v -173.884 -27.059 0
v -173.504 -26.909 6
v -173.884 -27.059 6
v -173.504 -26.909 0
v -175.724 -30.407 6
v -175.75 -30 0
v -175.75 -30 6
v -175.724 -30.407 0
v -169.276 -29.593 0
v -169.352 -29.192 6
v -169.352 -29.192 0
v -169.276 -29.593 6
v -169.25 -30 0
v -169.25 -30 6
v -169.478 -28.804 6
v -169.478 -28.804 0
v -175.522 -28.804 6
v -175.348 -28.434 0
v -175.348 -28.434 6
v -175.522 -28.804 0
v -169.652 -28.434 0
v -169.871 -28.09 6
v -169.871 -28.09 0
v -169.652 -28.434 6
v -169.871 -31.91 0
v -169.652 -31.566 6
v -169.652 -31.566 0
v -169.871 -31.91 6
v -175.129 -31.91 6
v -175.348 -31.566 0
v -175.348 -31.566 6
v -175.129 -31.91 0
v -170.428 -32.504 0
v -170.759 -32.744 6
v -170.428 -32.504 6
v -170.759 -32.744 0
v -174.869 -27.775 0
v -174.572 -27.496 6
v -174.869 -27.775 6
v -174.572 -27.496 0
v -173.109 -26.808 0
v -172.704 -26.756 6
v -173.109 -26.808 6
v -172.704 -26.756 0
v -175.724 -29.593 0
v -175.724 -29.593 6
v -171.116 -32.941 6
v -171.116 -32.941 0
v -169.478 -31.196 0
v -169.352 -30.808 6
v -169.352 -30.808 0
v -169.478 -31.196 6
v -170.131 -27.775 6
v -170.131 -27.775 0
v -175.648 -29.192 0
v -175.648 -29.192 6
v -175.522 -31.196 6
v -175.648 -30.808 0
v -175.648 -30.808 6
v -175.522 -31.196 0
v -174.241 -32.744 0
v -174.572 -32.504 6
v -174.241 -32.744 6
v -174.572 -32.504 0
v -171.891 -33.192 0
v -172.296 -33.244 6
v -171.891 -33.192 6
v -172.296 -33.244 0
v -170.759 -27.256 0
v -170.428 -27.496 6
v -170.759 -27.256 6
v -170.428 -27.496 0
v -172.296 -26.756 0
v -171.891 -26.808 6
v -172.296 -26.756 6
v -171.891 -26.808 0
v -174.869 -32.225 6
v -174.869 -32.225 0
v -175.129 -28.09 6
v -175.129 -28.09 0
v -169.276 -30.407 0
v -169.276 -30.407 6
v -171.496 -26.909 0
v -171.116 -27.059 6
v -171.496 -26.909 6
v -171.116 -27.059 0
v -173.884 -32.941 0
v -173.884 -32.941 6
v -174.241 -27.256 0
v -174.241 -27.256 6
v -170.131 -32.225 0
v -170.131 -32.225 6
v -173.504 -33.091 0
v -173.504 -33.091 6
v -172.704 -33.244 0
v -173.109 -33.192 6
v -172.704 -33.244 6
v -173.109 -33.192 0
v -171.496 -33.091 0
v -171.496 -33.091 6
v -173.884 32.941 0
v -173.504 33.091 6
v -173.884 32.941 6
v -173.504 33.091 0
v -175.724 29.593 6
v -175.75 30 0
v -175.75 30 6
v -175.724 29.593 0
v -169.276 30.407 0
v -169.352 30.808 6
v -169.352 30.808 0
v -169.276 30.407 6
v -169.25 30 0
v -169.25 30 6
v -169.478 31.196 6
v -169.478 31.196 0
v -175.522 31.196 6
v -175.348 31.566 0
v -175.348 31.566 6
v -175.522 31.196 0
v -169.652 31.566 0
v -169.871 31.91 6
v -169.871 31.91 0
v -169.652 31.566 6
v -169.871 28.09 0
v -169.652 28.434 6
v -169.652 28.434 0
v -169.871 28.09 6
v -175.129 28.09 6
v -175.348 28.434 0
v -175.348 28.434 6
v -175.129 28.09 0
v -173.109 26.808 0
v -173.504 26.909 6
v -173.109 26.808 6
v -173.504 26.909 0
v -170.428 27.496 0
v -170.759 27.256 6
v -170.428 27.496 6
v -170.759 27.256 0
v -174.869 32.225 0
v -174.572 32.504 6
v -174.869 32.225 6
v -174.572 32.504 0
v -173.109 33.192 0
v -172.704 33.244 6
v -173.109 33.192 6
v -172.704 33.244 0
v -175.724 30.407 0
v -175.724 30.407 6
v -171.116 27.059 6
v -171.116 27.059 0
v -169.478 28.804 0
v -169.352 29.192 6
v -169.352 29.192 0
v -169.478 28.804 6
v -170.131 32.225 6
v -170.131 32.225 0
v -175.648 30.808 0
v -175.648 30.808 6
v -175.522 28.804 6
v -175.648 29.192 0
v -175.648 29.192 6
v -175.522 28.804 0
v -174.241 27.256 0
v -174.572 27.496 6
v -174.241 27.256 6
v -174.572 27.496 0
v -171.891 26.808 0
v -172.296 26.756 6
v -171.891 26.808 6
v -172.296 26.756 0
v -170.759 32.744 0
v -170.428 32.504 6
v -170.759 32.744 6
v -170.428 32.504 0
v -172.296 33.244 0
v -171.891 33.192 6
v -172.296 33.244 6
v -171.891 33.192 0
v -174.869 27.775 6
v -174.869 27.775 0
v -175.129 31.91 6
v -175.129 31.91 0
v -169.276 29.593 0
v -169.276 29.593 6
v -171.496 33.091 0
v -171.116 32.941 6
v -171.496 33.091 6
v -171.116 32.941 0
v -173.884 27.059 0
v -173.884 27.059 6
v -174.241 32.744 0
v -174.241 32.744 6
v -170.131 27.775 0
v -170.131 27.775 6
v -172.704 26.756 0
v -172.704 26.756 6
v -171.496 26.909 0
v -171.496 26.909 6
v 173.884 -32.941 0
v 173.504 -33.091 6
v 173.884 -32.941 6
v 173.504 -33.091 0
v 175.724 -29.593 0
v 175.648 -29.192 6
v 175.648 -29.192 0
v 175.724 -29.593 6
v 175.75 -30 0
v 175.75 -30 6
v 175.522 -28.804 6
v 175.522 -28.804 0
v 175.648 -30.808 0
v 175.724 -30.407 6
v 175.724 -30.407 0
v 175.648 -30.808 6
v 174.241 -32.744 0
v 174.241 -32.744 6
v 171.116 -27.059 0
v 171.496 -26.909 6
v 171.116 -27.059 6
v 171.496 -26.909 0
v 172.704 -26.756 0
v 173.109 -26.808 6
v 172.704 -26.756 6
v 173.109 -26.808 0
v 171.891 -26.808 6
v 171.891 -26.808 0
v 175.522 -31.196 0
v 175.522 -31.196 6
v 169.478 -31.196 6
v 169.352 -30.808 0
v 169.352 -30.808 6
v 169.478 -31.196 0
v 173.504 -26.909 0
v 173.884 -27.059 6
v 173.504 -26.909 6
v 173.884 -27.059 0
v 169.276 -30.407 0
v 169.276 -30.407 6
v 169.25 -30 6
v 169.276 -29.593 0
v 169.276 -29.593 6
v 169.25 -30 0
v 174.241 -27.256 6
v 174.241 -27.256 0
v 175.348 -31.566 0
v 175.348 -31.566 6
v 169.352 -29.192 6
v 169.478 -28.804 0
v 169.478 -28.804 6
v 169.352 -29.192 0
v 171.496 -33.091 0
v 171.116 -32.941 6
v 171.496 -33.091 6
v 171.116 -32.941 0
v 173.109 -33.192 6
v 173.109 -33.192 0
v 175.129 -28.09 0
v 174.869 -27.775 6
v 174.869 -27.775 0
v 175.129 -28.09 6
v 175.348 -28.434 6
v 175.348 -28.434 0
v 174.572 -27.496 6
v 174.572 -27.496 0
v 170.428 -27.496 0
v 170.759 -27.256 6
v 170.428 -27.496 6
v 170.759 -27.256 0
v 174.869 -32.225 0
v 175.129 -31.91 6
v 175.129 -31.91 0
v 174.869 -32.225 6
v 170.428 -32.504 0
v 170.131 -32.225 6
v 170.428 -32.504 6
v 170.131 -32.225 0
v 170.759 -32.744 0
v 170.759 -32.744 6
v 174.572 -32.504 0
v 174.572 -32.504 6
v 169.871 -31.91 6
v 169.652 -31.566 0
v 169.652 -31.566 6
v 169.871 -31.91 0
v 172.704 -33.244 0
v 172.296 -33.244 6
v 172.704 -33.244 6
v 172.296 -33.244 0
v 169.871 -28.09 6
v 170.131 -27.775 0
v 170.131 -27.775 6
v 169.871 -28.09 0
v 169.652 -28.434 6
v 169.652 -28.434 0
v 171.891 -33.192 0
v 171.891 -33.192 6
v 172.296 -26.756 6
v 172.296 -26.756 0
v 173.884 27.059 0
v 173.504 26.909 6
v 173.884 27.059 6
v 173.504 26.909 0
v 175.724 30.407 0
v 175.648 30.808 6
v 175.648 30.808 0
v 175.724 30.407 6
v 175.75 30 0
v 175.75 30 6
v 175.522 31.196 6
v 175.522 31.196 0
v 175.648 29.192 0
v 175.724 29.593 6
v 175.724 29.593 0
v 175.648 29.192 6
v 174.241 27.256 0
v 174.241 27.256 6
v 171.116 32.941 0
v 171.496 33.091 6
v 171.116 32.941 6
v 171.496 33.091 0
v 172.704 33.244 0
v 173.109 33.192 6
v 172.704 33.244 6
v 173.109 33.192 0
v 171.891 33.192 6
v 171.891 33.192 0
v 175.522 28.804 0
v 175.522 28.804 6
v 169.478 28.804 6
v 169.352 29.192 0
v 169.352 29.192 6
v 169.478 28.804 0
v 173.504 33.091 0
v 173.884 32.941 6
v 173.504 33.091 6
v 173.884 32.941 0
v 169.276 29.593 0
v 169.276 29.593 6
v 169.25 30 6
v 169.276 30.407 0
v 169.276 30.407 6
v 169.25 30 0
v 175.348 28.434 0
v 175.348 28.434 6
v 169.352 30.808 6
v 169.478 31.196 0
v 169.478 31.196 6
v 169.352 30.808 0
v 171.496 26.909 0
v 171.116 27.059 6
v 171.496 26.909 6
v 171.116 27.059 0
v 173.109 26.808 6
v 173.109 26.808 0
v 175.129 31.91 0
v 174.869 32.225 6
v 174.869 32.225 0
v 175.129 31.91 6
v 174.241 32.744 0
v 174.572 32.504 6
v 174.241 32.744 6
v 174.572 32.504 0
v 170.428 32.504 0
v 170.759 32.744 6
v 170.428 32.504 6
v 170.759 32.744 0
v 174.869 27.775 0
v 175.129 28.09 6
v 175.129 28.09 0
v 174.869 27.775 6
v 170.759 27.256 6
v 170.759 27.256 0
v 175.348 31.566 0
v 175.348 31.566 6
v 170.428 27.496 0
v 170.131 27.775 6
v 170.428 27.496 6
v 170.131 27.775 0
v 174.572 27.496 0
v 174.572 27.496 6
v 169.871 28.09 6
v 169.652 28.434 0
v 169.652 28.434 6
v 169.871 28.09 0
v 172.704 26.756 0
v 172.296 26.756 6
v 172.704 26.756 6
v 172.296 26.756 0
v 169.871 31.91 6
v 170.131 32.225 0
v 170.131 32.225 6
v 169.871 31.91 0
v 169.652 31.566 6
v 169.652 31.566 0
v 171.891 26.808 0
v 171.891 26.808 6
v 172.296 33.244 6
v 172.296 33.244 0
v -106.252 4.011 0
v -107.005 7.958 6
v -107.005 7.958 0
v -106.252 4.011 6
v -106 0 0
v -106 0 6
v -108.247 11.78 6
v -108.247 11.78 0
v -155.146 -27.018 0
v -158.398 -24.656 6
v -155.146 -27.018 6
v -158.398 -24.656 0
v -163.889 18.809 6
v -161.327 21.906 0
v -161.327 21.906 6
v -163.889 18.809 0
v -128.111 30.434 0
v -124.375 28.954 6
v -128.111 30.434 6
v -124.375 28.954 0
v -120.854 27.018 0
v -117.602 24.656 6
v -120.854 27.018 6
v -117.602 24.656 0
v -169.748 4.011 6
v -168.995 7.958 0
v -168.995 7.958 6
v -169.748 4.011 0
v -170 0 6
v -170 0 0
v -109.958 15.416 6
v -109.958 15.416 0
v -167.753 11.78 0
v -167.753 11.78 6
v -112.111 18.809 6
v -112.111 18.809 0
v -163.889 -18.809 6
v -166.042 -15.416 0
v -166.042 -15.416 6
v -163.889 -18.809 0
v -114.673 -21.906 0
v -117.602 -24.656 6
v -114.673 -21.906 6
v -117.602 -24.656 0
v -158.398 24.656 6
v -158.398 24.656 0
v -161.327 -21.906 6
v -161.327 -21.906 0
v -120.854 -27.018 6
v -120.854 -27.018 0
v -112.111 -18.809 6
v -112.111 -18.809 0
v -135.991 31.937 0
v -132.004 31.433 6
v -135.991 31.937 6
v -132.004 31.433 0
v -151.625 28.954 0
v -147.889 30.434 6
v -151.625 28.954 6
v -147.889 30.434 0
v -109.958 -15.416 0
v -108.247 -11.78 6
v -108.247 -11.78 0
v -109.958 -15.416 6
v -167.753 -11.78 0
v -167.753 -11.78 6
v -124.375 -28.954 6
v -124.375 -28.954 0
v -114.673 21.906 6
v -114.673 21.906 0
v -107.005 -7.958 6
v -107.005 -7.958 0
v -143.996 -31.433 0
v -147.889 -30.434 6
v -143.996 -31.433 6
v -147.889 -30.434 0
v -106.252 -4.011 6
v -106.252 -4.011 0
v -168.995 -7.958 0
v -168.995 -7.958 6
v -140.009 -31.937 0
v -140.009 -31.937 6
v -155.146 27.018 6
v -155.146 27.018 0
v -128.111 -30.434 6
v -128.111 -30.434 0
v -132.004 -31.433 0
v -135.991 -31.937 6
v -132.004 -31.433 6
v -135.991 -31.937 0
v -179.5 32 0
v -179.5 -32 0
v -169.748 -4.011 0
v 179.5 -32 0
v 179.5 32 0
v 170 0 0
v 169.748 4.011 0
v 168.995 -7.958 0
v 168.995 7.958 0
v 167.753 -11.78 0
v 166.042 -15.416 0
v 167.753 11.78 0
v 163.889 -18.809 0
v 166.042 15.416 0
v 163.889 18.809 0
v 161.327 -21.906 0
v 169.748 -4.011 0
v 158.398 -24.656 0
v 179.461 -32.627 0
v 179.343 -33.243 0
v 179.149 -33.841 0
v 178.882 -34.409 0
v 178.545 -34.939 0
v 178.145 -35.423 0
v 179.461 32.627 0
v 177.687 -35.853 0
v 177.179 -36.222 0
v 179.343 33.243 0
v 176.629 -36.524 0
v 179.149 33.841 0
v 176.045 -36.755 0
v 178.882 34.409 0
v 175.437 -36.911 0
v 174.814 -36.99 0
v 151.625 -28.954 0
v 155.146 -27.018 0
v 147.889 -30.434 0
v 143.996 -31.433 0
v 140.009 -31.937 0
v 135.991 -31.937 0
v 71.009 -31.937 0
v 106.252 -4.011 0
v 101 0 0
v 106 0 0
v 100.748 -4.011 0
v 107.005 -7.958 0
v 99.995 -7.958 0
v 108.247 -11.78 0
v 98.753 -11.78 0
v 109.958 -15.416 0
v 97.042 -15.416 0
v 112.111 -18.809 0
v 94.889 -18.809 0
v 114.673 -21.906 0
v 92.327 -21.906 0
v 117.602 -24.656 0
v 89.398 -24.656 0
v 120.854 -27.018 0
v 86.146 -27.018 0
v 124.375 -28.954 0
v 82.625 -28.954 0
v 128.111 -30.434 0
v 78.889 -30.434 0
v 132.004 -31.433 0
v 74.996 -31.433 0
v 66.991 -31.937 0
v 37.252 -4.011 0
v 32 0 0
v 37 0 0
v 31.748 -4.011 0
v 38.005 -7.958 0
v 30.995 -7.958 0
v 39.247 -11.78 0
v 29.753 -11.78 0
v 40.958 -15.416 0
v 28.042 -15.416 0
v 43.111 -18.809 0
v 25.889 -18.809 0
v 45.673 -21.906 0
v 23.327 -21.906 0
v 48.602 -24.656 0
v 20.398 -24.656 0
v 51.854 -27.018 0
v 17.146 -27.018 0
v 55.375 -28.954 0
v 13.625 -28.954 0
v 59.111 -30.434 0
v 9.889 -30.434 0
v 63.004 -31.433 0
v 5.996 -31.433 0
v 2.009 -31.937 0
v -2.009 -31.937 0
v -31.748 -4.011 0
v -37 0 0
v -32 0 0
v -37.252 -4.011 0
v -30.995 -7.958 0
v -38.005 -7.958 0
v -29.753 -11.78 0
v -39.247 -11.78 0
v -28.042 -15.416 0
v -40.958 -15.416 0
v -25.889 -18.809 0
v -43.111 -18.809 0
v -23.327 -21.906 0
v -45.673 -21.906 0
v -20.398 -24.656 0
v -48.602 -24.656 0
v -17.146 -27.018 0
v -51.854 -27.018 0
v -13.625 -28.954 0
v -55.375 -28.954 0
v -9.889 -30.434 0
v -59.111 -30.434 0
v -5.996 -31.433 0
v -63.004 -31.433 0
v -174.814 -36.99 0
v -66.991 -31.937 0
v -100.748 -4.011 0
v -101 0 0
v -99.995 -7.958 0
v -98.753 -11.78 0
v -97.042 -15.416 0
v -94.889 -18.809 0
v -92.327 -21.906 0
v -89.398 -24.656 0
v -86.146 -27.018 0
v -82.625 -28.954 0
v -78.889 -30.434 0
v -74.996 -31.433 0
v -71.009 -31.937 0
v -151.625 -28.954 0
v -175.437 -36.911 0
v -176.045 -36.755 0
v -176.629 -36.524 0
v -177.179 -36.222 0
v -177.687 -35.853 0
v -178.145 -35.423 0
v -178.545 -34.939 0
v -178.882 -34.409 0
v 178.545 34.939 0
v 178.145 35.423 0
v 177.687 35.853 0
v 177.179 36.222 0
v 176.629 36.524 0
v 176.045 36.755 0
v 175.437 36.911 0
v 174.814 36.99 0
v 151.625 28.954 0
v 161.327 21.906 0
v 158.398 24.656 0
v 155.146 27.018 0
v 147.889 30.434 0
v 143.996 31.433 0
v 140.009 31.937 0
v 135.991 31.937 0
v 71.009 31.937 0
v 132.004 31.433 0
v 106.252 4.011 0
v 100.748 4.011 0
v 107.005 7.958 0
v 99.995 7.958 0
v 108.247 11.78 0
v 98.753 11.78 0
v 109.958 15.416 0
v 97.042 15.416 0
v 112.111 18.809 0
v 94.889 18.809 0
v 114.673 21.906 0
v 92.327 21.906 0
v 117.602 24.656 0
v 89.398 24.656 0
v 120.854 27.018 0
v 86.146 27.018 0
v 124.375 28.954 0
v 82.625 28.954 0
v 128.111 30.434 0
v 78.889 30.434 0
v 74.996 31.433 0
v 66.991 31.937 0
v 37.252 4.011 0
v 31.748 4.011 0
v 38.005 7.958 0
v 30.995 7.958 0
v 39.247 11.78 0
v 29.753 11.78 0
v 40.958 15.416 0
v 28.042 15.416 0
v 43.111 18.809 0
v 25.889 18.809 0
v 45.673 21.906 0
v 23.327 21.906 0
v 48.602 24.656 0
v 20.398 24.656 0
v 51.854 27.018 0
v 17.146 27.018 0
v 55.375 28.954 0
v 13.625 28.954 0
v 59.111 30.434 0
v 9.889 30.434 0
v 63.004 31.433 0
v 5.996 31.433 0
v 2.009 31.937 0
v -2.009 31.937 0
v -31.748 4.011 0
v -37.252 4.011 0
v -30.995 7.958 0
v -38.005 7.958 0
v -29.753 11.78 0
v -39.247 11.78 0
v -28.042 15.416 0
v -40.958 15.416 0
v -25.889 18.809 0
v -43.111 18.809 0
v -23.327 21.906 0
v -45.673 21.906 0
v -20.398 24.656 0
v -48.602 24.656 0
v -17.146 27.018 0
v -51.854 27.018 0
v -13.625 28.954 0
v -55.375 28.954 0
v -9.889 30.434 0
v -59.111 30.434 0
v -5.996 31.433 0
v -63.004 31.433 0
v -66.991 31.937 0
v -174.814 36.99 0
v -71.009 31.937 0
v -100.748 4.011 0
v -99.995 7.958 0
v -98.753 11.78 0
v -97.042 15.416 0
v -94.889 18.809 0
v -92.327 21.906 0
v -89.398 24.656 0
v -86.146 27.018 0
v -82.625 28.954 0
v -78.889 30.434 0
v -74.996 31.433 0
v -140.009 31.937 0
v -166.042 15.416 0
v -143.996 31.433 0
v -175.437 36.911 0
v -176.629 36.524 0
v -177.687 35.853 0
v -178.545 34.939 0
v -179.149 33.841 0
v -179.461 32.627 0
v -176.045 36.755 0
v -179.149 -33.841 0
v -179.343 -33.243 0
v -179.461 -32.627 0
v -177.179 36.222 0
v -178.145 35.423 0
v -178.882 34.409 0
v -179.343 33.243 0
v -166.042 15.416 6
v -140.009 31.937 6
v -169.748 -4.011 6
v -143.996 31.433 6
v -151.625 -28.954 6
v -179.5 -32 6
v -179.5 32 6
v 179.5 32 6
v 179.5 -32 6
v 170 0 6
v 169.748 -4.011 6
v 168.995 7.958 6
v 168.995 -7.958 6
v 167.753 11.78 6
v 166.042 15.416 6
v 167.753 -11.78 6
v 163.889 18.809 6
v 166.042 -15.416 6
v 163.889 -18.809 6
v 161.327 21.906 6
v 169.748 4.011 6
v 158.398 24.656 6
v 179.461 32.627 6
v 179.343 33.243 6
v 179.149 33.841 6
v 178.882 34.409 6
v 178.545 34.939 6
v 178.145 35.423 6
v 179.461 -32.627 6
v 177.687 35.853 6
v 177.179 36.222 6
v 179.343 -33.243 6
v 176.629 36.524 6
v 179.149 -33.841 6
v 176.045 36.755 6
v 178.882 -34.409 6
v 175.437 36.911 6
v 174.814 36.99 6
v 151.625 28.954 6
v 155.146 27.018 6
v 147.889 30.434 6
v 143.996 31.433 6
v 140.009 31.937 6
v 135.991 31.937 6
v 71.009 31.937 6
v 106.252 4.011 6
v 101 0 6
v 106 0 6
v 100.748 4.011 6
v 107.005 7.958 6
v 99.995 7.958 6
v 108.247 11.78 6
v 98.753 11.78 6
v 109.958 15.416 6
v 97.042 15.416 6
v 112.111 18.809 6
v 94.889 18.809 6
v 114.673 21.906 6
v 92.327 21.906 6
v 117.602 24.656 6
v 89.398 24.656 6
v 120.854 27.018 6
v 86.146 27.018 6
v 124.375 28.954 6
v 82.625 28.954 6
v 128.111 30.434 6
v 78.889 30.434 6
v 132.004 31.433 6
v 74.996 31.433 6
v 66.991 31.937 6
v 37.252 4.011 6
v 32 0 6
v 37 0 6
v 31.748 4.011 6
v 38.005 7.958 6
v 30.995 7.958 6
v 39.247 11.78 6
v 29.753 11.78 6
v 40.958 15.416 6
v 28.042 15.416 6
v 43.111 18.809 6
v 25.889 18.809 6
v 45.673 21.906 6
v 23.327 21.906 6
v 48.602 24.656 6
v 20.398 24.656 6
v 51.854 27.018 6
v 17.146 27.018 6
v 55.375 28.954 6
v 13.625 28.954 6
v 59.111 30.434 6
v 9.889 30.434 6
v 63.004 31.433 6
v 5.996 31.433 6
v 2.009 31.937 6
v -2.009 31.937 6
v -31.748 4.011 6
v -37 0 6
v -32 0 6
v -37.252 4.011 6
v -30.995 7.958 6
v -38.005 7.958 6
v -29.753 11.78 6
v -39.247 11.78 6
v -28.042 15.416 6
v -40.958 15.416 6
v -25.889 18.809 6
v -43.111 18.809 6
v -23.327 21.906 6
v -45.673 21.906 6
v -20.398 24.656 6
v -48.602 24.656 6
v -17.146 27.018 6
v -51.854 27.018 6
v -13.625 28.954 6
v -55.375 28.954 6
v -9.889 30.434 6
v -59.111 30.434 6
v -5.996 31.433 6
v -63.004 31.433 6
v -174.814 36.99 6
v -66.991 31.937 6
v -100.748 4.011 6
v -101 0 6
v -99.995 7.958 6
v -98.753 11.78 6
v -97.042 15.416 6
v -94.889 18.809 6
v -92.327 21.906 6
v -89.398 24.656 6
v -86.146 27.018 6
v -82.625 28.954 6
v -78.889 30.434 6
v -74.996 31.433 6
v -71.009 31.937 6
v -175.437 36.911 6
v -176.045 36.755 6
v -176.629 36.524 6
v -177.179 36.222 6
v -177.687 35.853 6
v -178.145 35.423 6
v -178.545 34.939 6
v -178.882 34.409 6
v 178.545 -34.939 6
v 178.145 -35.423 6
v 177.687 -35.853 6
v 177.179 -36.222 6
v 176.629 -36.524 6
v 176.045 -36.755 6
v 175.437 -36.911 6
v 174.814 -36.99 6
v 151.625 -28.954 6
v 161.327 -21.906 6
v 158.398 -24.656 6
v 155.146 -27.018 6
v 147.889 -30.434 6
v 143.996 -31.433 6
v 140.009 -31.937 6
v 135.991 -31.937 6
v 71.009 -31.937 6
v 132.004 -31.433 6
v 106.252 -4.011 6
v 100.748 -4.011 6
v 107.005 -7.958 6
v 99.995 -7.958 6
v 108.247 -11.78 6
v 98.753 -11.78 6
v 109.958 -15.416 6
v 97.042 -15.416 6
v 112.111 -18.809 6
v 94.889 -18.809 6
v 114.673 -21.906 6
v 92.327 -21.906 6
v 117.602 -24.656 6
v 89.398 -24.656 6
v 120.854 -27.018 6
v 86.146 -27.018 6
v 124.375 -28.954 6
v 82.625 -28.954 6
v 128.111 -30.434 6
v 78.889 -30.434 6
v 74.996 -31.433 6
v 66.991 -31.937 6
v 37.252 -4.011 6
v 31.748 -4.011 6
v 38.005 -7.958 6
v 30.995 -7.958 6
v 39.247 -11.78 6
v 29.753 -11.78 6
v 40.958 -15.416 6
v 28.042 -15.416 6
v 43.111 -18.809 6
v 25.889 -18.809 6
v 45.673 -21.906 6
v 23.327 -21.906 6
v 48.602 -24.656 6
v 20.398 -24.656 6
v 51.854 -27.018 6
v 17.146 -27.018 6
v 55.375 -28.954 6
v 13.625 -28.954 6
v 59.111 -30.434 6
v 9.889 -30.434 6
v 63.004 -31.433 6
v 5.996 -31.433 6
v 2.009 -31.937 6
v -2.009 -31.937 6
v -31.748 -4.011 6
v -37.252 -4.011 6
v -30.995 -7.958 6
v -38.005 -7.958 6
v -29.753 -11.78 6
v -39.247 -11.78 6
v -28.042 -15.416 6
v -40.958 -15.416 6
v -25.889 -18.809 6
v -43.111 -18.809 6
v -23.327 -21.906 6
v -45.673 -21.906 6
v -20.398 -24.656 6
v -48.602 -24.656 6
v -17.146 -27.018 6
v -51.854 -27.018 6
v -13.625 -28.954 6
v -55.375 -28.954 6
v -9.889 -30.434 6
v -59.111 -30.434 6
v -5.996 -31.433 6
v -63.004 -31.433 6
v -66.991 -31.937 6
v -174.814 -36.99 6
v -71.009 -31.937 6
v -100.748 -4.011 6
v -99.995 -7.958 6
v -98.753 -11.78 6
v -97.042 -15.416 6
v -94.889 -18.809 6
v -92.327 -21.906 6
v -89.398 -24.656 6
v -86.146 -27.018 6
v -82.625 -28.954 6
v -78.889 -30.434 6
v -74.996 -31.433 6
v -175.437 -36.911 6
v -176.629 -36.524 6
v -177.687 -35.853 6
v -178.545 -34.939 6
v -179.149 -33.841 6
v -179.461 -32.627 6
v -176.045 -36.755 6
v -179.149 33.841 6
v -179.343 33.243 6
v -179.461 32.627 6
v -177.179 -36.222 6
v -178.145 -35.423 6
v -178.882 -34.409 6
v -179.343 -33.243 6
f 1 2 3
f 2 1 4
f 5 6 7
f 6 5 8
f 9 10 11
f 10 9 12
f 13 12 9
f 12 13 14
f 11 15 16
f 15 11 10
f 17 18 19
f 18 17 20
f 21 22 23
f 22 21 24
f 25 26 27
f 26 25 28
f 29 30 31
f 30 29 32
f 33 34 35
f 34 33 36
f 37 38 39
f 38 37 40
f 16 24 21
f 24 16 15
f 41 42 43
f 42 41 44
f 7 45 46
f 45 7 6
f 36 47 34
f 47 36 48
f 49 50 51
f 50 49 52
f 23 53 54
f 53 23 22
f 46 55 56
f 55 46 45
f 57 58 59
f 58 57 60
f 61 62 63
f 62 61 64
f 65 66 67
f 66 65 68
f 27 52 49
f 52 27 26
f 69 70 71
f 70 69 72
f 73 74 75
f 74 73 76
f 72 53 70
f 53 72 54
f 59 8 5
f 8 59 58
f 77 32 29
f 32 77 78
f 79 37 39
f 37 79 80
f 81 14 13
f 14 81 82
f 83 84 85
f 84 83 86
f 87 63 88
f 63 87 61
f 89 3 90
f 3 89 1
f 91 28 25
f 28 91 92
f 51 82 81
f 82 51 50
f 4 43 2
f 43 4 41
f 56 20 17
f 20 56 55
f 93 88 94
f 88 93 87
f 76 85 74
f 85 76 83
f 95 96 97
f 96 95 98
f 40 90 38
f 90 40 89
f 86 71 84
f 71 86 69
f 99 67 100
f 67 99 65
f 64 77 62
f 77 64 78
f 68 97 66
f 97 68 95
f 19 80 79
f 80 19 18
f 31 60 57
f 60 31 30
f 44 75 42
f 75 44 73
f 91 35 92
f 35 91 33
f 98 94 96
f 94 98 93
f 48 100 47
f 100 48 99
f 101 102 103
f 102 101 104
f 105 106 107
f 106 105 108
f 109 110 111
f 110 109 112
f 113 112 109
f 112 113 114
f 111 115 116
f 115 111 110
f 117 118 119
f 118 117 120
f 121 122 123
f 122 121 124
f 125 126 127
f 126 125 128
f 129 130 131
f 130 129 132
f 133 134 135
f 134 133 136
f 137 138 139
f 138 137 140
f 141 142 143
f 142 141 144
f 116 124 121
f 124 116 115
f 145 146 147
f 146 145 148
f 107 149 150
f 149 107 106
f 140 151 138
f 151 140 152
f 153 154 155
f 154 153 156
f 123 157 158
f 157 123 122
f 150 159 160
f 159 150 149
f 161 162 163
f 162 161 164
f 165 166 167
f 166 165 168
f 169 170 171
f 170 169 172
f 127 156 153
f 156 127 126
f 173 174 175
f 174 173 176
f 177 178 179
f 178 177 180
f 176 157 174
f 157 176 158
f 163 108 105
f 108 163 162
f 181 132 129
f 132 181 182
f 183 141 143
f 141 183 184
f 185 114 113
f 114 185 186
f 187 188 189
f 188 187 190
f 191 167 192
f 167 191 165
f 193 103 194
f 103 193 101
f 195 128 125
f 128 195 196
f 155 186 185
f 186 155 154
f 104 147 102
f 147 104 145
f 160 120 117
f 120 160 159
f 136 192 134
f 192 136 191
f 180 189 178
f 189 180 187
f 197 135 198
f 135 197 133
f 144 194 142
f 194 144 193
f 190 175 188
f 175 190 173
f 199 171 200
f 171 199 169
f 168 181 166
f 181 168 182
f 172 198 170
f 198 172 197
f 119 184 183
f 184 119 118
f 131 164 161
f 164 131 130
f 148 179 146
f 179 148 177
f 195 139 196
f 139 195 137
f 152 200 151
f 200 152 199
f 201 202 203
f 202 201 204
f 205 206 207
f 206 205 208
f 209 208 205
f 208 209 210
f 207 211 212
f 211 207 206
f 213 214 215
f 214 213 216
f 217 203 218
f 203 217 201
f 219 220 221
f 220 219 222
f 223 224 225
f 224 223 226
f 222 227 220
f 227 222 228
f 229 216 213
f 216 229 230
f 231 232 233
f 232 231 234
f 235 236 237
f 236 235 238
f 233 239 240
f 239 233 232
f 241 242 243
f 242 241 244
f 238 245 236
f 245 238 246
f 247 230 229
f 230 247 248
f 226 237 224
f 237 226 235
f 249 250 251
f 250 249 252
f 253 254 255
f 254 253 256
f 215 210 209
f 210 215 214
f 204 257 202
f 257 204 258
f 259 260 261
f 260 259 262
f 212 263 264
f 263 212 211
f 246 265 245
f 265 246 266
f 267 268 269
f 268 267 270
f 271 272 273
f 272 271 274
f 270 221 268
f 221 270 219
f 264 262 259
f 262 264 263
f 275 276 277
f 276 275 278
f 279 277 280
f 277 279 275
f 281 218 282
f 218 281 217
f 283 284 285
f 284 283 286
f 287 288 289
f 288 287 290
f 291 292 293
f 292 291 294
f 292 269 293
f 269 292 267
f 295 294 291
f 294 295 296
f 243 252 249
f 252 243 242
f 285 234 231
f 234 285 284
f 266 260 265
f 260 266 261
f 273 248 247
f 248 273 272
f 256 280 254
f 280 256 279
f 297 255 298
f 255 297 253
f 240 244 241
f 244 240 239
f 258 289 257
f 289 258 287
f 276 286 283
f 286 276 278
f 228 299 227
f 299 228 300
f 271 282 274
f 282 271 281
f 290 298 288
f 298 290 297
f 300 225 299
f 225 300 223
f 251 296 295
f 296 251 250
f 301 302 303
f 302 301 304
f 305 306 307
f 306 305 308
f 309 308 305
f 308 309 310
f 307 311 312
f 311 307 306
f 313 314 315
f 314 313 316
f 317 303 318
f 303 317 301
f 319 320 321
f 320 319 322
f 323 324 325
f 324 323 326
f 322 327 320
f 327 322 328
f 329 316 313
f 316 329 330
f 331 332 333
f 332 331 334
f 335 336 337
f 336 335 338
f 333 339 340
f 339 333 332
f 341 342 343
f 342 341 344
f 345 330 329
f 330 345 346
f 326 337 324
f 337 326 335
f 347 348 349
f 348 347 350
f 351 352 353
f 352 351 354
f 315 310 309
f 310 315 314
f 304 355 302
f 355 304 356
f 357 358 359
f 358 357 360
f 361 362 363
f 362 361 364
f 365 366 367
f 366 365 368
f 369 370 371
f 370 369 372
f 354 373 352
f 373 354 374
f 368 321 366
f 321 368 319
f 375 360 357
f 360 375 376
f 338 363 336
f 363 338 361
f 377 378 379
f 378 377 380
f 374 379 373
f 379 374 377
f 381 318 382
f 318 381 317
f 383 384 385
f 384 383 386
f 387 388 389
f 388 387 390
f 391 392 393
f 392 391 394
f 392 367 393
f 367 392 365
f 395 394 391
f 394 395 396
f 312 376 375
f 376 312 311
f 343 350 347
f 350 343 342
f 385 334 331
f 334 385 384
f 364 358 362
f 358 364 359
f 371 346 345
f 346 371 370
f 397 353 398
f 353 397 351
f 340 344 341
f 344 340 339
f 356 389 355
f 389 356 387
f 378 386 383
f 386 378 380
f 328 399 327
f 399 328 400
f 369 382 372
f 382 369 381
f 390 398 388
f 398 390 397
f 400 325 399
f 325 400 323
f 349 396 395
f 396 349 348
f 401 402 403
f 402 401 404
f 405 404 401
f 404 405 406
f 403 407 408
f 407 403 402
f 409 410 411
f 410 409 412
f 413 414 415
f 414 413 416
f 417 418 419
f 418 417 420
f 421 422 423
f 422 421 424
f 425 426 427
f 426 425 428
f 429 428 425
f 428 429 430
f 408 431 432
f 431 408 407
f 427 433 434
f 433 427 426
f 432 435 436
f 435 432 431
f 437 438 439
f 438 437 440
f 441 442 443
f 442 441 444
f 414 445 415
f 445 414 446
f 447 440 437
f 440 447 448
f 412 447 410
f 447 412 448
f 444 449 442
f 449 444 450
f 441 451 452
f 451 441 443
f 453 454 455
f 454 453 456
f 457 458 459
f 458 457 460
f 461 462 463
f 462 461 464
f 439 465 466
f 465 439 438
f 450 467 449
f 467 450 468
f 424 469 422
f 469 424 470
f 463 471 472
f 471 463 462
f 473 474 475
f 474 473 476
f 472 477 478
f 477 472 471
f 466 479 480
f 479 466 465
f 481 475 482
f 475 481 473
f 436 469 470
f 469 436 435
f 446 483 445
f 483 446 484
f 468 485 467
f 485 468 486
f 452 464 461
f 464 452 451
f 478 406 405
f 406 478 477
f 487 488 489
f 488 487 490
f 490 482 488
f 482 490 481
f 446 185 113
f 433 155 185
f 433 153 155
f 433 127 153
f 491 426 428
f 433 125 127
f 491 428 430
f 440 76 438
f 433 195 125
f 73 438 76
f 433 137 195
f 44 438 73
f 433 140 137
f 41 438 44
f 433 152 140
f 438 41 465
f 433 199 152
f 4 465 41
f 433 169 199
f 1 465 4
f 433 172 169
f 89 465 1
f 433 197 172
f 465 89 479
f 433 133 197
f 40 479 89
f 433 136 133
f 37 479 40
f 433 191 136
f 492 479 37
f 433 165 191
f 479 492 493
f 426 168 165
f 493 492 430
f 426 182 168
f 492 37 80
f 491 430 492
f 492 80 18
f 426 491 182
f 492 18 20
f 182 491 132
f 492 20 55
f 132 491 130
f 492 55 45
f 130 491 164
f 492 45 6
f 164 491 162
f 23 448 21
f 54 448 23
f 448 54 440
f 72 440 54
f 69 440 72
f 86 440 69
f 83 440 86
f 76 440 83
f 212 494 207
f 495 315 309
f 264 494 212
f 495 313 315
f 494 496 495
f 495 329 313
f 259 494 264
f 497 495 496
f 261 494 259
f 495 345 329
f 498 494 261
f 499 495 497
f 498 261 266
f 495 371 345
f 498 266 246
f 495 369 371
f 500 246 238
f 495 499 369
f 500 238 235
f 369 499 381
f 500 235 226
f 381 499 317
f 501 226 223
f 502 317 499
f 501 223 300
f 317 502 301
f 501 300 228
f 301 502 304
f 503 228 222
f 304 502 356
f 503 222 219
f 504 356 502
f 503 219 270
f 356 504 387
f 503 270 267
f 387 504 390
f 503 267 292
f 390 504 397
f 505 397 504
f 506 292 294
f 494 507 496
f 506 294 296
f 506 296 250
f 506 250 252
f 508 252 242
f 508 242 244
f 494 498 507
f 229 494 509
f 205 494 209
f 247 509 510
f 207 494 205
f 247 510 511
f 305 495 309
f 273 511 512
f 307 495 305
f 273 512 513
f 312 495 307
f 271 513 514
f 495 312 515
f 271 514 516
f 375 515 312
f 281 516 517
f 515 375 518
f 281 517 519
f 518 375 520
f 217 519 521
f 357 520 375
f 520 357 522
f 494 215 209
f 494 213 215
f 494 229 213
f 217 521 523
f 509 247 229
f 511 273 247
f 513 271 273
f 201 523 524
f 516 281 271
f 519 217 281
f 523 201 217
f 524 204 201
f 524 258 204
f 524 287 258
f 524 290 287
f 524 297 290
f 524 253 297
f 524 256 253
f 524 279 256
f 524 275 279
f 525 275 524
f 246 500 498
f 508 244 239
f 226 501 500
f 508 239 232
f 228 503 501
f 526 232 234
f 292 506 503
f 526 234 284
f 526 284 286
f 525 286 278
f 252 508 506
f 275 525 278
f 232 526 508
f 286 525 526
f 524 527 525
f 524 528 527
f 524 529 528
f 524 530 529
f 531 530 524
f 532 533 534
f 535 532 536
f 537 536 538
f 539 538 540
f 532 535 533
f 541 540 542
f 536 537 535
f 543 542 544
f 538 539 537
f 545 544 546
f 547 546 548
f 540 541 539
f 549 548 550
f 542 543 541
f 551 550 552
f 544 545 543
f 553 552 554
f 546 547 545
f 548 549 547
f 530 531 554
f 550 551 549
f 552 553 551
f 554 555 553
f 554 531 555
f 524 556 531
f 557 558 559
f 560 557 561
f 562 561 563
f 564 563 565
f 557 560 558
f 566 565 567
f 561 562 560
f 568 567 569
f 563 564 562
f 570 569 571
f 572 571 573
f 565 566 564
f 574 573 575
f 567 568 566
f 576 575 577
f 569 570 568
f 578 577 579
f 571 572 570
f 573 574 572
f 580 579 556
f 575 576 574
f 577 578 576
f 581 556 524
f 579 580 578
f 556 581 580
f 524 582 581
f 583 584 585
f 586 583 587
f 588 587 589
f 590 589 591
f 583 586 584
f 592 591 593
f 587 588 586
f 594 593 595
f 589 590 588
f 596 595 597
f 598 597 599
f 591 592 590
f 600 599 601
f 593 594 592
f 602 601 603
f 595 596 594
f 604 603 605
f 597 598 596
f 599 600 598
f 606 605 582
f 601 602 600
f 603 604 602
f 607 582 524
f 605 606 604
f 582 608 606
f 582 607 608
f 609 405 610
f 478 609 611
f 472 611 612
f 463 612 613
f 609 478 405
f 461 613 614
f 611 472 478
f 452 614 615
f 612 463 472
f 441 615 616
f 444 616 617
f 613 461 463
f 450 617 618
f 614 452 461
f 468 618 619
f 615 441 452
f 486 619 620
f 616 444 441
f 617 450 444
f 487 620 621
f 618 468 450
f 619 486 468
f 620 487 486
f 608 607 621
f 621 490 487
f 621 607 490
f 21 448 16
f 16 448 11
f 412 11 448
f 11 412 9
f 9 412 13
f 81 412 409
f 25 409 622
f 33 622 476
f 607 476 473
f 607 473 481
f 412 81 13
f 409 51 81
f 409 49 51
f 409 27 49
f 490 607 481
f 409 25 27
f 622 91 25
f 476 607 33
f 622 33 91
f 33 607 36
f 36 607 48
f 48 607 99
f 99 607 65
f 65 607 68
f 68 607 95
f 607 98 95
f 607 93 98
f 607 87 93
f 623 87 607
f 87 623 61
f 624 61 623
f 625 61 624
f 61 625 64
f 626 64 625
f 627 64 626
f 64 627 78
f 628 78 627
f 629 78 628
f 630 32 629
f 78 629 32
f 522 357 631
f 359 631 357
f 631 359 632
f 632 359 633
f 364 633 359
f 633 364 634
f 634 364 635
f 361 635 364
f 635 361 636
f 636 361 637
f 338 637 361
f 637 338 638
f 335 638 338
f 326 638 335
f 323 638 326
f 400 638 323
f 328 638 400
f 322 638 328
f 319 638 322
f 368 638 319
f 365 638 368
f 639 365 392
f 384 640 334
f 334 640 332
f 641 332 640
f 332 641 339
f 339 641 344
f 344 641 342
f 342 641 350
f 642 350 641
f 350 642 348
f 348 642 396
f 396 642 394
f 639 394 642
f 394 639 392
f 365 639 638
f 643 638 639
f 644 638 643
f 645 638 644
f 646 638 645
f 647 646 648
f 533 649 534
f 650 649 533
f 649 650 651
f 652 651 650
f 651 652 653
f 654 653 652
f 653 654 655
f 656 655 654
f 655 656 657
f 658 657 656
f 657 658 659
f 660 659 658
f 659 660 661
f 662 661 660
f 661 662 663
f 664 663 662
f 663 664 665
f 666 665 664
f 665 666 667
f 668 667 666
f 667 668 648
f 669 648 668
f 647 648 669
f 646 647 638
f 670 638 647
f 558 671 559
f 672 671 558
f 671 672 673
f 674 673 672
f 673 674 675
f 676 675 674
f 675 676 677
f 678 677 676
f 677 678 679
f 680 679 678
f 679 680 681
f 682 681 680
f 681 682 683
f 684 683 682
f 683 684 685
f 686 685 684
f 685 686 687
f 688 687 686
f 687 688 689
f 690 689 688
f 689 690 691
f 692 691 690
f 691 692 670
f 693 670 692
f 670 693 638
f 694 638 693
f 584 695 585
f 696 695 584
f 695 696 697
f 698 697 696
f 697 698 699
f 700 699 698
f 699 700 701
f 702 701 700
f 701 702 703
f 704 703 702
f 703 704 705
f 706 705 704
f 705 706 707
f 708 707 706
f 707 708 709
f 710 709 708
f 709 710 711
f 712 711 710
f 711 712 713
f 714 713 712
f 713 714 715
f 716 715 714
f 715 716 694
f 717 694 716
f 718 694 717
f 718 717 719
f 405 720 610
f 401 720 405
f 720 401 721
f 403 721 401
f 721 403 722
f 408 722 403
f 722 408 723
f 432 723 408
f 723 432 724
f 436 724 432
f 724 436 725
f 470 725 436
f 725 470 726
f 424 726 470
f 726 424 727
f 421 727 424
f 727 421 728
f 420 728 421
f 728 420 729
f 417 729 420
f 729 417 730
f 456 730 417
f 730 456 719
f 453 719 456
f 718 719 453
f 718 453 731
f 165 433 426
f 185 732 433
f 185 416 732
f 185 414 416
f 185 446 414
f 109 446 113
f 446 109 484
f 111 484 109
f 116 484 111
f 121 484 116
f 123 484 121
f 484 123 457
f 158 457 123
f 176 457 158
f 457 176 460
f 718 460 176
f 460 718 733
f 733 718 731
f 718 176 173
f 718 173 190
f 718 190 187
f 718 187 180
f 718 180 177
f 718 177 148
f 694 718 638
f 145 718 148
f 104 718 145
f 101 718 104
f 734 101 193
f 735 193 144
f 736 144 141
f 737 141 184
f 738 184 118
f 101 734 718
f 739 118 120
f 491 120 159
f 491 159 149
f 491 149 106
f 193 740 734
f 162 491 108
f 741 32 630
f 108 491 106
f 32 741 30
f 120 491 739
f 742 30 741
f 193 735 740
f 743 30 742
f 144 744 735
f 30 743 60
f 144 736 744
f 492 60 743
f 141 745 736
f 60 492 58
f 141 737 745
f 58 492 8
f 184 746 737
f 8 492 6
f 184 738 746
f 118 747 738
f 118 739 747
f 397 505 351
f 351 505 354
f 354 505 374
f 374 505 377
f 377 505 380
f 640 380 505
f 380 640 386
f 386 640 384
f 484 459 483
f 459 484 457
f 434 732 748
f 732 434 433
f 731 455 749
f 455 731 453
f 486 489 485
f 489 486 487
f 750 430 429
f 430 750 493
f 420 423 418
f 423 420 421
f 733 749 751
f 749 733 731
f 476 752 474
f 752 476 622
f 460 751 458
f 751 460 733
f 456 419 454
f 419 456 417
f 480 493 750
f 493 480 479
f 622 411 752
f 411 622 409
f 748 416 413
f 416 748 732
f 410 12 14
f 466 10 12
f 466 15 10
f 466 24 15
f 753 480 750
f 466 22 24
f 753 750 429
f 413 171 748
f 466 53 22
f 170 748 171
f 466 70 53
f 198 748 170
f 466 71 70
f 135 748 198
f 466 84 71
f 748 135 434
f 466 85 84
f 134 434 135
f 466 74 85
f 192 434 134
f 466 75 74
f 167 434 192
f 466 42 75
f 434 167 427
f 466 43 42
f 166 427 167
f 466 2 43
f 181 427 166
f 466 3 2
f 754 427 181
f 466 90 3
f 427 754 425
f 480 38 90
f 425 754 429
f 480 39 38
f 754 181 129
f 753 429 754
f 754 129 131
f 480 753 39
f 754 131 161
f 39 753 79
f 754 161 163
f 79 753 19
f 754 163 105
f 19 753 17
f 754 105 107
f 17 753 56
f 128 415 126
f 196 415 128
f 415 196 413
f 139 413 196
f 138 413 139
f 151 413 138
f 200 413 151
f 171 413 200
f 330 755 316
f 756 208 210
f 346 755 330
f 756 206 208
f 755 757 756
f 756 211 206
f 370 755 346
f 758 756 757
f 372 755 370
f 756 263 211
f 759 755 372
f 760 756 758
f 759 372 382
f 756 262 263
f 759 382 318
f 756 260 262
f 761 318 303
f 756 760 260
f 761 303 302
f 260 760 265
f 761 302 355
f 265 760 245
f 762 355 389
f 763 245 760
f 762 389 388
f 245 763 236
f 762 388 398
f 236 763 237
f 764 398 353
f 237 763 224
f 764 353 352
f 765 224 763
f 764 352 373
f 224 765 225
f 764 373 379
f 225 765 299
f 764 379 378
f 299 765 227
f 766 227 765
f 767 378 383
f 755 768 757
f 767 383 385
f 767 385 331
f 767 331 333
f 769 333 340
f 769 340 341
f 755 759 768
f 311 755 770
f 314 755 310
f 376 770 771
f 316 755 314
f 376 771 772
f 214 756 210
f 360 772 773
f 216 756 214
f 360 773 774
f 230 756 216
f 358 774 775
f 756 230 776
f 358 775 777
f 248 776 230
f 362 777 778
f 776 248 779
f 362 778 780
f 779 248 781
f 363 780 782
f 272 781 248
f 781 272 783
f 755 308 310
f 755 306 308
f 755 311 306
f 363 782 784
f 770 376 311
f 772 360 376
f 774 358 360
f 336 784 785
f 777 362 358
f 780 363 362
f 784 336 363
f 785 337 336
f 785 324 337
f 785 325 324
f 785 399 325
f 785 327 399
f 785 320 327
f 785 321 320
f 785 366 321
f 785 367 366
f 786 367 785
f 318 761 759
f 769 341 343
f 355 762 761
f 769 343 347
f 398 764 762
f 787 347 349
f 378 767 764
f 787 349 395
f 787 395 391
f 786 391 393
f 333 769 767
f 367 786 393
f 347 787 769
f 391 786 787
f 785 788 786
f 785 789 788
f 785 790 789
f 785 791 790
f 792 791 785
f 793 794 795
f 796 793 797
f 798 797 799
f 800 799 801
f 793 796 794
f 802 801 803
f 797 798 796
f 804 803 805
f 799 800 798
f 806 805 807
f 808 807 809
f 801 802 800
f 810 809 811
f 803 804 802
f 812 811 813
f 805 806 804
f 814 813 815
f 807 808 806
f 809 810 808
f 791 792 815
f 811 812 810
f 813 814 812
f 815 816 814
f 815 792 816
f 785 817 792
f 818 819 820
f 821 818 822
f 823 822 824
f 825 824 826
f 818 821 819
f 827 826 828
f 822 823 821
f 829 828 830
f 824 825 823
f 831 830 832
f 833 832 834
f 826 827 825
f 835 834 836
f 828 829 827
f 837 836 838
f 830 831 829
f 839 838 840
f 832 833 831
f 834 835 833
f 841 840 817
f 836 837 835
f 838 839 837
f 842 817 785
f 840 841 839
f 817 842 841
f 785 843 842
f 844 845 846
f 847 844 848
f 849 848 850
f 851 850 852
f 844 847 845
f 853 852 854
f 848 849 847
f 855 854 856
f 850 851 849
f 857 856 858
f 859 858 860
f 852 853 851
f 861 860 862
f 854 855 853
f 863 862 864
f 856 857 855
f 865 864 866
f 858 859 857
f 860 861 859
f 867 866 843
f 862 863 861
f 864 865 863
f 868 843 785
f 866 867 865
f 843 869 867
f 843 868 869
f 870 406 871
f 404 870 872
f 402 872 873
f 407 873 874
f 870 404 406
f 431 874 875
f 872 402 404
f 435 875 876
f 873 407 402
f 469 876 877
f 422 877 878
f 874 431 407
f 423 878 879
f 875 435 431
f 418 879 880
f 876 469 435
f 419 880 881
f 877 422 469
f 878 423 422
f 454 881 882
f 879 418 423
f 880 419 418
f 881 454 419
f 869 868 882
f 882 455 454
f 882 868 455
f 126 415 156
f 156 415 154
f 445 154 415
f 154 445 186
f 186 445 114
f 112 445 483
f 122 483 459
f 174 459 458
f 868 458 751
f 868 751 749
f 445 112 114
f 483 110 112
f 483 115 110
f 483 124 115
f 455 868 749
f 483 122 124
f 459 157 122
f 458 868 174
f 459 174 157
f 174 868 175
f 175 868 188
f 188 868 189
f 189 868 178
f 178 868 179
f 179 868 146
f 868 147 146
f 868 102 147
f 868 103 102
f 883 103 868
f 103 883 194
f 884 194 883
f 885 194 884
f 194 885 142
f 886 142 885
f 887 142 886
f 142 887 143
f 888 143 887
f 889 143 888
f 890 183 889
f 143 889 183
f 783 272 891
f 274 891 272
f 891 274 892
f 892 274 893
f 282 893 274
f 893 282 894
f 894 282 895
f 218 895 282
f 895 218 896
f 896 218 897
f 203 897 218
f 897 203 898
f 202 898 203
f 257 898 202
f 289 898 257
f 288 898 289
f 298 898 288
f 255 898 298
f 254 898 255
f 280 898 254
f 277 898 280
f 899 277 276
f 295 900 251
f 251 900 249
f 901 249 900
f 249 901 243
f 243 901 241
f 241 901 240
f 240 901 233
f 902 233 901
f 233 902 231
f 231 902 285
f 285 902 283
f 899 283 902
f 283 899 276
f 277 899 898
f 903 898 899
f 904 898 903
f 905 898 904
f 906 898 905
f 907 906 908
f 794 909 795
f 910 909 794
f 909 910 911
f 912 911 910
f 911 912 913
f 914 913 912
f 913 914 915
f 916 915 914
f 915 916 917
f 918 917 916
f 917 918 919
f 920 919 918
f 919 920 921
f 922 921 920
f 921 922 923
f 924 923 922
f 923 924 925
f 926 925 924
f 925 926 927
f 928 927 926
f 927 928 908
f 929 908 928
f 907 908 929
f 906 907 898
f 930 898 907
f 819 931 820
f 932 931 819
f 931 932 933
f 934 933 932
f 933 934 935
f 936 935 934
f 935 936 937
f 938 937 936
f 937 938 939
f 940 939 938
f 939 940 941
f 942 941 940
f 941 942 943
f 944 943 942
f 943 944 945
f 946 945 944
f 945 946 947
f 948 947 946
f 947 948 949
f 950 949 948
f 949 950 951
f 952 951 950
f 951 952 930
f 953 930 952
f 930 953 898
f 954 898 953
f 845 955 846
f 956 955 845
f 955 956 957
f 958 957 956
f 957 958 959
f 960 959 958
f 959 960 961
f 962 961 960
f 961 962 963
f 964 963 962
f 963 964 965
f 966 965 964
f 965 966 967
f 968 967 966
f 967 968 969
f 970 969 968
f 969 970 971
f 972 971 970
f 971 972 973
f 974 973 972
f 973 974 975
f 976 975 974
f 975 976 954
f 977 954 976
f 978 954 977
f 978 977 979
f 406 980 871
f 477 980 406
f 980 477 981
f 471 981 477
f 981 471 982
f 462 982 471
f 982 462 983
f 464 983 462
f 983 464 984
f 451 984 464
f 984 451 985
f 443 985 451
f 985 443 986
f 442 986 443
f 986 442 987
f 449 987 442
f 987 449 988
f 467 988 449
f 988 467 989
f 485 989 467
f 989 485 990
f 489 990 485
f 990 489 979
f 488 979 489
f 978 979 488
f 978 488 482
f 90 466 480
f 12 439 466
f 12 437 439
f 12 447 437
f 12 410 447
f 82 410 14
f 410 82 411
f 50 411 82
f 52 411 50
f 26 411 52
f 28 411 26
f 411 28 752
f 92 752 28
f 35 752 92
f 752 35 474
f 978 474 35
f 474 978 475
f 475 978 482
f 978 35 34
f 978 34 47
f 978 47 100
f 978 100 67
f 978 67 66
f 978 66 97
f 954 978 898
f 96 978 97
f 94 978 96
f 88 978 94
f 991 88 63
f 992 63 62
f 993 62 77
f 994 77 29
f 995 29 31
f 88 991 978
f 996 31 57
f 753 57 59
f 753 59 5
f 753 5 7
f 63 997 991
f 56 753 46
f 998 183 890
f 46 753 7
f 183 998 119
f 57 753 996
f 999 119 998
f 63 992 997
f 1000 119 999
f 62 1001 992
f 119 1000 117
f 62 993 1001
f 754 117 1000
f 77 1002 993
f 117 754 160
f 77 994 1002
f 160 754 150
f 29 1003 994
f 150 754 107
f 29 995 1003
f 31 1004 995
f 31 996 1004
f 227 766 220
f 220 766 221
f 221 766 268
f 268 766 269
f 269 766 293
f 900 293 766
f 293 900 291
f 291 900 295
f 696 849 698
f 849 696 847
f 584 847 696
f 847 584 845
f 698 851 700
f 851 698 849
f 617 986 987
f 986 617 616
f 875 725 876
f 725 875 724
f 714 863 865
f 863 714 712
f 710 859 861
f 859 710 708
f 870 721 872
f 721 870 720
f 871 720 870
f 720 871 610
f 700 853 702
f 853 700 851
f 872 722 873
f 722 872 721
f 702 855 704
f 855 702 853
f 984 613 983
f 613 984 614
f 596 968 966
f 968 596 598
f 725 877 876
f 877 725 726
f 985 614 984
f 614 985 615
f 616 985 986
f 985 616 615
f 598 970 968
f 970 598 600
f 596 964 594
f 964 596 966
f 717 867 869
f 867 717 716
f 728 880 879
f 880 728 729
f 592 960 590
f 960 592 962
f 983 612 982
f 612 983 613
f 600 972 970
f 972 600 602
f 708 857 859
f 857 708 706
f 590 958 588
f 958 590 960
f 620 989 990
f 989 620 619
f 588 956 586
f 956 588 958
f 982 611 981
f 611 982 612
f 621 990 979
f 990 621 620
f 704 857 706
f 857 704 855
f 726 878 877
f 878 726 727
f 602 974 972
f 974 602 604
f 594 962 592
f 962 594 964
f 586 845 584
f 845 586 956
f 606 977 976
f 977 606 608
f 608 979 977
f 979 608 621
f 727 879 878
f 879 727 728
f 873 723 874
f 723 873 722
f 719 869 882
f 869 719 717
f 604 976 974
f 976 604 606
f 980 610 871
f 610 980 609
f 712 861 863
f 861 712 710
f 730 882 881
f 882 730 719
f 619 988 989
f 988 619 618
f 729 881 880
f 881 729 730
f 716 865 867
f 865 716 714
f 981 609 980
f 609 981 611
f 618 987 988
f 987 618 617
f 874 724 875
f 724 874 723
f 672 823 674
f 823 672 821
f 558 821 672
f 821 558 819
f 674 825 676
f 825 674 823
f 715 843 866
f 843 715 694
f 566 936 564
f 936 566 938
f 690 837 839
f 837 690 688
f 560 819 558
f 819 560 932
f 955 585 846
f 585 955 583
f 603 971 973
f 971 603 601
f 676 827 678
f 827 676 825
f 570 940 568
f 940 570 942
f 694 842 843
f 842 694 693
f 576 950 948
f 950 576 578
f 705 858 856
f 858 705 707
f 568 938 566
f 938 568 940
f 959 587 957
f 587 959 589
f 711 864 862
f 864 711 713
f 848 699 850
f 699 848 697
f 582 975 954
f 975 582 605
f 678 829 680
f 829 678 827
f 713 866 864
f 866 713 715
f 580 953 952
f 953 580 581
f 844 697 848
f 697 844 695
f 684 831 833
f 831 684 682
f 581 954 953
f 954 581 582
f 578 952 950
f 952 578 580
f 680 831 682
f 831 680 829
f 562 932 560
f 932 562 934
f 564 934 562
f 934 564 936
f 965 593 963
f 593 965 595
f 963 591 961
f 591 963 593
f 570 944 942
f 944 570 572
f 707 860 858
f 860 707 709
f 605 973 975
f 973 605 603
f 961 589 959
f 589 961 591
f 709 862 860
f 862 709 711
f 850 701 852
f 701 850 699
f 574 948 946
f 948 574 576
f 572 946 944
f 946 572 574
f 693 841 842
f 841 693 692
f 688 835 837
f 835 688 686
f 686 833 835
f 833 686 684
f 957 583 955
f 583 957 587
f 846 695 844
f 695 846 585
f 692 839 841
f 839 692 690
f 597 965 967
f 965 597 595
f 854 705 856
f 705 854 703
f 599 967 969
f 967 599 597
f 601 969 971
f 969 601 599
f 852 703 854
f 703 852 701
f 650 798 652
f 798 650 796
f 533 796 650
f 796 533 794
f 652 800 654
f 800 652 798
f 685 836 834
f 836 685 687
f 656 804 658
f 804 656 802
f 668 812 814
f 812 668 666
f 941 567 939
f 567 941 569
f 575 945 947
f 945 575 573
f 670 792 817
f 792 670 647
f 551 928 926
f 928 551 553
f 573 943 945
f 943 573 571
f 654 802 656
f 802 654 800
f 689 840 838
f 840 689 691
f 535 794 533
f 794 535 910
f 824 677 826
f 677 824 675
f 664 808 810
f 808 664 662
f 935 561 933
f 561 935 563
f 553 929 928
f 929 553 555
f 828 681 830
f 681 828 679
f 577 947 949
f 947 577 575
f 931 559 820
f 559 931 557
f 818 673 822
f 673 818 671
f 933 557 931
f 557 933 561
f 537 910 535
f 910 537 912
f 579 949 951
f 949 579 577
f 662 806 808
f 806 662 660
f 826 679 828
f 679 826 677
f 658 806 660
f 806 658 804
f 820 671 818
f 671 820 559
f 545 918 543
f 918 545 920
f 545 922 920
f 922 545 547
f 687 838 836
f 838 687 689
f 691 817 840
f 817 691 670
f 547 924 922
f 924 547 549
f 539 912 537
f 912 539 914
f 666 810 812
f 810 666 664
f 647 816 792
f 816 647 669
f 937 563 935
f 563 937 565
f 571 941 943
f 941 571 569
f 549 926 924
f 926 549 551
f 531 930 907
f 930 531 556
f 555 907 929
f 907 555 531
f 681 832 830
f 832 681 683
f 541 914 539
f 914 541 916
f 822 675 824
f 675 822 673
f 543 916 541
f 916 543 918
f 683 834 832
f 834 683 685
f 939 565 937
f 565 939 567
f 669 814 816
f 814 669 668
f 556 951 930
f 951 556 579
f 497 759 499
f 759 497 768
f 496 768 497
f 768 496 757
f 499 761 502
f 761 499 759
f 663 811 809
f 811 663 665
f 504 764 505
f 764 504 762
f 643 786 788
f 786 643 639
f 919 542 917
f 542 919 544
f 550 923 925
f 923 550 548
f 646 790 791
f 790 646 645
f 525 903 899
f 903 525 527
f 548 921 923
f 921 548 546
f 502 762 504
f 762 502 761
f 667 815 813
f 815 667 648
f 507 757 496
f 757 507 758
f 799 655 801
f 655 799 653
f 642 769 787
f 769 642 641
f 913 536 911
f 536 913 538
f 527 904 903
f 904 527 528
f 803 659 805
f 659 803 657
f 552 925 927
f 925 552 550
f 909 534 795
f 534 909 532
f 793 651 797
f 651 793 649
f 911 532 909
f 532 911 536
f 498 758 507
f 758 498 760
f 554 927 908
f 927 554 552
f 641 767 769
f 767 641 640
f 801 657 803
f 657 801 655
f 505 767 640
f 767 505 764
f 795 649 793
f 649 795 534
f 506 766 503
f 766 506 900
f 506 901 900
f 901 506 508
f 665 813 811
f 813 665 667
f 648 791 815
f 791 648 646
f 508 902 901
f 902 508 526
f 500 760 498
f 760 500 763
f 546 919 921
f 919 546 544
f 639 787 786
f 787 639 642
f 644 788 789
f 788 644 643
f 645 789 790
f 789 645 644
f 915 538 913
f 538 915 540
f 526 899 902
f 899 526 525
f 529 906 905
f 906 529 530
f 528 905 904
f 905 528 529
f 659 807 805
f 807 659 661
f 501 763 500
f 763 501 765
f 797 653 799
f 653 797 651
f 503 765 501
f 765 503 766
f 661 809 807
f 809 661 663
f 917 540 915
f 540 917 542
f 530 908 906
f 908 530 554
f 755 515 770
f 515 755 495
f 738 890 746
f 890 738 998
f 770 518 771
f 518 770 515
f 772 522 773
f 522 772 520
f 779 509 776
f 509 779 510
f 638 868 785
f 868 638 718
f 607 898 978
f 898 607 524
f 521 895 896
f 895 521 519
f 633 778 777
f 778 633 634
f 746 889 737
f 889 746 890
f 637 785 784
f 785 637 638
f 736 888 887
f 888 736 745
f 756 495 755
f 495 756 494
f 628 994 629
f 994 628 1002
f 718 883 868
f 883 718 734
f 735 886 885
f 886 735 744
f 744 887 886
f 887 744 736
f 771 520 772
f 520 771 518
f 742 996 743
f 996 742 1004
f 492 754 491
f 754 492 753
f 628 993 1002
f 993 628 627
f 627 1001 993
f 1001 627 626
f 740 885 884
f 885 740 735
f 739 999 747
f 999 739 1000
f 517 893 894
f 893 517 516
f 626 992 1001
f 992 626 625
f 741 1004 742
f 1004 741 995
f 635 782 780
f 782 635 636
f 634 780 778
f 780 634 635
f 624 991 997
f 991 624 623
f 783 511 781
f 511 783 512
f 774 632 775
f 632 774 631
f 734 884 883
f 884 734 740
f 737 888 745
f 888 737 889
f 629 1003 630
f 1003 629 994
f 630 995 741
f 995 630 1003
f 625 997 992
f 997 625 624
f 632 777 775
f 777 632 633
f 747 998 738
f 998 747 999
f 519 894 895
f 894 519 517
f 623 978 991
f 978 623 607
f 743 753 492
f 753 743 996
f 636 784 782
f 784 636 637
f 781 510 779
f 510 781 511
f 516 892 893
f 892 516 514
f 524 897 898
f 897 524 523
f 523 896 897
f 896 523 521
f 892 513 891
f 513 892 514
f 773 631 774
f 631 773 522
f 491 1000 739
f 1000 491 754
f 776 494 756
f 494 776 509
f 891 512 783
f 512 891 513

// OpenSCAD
$fn = 50;

difference() {
	union() {
		hull() {
			translate(v = [-174.5, 32.0, 0]) {
				cylinder(h = 6, r = 5);
			}
			translate(v = [174.5, 32.0, 0]) {
				cylinder(h = 6, r = 5);
			}
			translate(v = [-174.5, -32.0, 0]) {
				cylinder(h = 6, r = 5);
			}
			translate(v = [174.5, -32.0, 0]) {
				cylinder(h = 6, r = 5);
			}
		}
	}
	union() {
		translate(v = [-172.5, -30.0, -100.0]) {
			cylinder(h = 200, r = 3.25);
		}
		translate(v = [-172.5, 30.0, -100.0]) {
			cylinder(h = 200, r = 3.25);
		}
		translate(v = [172.5, -30.0, -100.0]) {
			cylinder(h = 200, r = 3.25);
		}
		translate(v = [172.5, 30.0, -100.0]) {
			cylinder(h = 200, r = 3.25);
		}
		translate(v = [-172.5, -30.0, -100.0]) {
			cylinder(h = 200, r = 1.8);
		}
		translate(v = [-172.5, 30.0, -100.0]) {
			cylinder(h = 200, r = 1.8);
		}
		translate(v = [172.5, -30.0, -100.0]) {
			cylinder(h = 200, r = 1.8);
		}
		translate(v = [172.5, 30.0, -100.0]) {
			cylinder(h = 200, r = 1.8);
		}
		translate(v = [-138.0, 0, 0.0]) {
			cylinder(h = 6, r = 32.0);
		}
		translate(v = [-69.0, 0, 0.0]) {
			cylinder(h = 6, r = 32.0);
		}
		cylinder(h = 6, r = 32.0);
		translate(v = [69.0, 0, 0.0]) {
			cylinder(h = 6, r = 32.0);
		}
		translate(v = [138.0, 0, 0.0]) {
			cylinder(h = 6, r = 32.0);
		}
	}
}
